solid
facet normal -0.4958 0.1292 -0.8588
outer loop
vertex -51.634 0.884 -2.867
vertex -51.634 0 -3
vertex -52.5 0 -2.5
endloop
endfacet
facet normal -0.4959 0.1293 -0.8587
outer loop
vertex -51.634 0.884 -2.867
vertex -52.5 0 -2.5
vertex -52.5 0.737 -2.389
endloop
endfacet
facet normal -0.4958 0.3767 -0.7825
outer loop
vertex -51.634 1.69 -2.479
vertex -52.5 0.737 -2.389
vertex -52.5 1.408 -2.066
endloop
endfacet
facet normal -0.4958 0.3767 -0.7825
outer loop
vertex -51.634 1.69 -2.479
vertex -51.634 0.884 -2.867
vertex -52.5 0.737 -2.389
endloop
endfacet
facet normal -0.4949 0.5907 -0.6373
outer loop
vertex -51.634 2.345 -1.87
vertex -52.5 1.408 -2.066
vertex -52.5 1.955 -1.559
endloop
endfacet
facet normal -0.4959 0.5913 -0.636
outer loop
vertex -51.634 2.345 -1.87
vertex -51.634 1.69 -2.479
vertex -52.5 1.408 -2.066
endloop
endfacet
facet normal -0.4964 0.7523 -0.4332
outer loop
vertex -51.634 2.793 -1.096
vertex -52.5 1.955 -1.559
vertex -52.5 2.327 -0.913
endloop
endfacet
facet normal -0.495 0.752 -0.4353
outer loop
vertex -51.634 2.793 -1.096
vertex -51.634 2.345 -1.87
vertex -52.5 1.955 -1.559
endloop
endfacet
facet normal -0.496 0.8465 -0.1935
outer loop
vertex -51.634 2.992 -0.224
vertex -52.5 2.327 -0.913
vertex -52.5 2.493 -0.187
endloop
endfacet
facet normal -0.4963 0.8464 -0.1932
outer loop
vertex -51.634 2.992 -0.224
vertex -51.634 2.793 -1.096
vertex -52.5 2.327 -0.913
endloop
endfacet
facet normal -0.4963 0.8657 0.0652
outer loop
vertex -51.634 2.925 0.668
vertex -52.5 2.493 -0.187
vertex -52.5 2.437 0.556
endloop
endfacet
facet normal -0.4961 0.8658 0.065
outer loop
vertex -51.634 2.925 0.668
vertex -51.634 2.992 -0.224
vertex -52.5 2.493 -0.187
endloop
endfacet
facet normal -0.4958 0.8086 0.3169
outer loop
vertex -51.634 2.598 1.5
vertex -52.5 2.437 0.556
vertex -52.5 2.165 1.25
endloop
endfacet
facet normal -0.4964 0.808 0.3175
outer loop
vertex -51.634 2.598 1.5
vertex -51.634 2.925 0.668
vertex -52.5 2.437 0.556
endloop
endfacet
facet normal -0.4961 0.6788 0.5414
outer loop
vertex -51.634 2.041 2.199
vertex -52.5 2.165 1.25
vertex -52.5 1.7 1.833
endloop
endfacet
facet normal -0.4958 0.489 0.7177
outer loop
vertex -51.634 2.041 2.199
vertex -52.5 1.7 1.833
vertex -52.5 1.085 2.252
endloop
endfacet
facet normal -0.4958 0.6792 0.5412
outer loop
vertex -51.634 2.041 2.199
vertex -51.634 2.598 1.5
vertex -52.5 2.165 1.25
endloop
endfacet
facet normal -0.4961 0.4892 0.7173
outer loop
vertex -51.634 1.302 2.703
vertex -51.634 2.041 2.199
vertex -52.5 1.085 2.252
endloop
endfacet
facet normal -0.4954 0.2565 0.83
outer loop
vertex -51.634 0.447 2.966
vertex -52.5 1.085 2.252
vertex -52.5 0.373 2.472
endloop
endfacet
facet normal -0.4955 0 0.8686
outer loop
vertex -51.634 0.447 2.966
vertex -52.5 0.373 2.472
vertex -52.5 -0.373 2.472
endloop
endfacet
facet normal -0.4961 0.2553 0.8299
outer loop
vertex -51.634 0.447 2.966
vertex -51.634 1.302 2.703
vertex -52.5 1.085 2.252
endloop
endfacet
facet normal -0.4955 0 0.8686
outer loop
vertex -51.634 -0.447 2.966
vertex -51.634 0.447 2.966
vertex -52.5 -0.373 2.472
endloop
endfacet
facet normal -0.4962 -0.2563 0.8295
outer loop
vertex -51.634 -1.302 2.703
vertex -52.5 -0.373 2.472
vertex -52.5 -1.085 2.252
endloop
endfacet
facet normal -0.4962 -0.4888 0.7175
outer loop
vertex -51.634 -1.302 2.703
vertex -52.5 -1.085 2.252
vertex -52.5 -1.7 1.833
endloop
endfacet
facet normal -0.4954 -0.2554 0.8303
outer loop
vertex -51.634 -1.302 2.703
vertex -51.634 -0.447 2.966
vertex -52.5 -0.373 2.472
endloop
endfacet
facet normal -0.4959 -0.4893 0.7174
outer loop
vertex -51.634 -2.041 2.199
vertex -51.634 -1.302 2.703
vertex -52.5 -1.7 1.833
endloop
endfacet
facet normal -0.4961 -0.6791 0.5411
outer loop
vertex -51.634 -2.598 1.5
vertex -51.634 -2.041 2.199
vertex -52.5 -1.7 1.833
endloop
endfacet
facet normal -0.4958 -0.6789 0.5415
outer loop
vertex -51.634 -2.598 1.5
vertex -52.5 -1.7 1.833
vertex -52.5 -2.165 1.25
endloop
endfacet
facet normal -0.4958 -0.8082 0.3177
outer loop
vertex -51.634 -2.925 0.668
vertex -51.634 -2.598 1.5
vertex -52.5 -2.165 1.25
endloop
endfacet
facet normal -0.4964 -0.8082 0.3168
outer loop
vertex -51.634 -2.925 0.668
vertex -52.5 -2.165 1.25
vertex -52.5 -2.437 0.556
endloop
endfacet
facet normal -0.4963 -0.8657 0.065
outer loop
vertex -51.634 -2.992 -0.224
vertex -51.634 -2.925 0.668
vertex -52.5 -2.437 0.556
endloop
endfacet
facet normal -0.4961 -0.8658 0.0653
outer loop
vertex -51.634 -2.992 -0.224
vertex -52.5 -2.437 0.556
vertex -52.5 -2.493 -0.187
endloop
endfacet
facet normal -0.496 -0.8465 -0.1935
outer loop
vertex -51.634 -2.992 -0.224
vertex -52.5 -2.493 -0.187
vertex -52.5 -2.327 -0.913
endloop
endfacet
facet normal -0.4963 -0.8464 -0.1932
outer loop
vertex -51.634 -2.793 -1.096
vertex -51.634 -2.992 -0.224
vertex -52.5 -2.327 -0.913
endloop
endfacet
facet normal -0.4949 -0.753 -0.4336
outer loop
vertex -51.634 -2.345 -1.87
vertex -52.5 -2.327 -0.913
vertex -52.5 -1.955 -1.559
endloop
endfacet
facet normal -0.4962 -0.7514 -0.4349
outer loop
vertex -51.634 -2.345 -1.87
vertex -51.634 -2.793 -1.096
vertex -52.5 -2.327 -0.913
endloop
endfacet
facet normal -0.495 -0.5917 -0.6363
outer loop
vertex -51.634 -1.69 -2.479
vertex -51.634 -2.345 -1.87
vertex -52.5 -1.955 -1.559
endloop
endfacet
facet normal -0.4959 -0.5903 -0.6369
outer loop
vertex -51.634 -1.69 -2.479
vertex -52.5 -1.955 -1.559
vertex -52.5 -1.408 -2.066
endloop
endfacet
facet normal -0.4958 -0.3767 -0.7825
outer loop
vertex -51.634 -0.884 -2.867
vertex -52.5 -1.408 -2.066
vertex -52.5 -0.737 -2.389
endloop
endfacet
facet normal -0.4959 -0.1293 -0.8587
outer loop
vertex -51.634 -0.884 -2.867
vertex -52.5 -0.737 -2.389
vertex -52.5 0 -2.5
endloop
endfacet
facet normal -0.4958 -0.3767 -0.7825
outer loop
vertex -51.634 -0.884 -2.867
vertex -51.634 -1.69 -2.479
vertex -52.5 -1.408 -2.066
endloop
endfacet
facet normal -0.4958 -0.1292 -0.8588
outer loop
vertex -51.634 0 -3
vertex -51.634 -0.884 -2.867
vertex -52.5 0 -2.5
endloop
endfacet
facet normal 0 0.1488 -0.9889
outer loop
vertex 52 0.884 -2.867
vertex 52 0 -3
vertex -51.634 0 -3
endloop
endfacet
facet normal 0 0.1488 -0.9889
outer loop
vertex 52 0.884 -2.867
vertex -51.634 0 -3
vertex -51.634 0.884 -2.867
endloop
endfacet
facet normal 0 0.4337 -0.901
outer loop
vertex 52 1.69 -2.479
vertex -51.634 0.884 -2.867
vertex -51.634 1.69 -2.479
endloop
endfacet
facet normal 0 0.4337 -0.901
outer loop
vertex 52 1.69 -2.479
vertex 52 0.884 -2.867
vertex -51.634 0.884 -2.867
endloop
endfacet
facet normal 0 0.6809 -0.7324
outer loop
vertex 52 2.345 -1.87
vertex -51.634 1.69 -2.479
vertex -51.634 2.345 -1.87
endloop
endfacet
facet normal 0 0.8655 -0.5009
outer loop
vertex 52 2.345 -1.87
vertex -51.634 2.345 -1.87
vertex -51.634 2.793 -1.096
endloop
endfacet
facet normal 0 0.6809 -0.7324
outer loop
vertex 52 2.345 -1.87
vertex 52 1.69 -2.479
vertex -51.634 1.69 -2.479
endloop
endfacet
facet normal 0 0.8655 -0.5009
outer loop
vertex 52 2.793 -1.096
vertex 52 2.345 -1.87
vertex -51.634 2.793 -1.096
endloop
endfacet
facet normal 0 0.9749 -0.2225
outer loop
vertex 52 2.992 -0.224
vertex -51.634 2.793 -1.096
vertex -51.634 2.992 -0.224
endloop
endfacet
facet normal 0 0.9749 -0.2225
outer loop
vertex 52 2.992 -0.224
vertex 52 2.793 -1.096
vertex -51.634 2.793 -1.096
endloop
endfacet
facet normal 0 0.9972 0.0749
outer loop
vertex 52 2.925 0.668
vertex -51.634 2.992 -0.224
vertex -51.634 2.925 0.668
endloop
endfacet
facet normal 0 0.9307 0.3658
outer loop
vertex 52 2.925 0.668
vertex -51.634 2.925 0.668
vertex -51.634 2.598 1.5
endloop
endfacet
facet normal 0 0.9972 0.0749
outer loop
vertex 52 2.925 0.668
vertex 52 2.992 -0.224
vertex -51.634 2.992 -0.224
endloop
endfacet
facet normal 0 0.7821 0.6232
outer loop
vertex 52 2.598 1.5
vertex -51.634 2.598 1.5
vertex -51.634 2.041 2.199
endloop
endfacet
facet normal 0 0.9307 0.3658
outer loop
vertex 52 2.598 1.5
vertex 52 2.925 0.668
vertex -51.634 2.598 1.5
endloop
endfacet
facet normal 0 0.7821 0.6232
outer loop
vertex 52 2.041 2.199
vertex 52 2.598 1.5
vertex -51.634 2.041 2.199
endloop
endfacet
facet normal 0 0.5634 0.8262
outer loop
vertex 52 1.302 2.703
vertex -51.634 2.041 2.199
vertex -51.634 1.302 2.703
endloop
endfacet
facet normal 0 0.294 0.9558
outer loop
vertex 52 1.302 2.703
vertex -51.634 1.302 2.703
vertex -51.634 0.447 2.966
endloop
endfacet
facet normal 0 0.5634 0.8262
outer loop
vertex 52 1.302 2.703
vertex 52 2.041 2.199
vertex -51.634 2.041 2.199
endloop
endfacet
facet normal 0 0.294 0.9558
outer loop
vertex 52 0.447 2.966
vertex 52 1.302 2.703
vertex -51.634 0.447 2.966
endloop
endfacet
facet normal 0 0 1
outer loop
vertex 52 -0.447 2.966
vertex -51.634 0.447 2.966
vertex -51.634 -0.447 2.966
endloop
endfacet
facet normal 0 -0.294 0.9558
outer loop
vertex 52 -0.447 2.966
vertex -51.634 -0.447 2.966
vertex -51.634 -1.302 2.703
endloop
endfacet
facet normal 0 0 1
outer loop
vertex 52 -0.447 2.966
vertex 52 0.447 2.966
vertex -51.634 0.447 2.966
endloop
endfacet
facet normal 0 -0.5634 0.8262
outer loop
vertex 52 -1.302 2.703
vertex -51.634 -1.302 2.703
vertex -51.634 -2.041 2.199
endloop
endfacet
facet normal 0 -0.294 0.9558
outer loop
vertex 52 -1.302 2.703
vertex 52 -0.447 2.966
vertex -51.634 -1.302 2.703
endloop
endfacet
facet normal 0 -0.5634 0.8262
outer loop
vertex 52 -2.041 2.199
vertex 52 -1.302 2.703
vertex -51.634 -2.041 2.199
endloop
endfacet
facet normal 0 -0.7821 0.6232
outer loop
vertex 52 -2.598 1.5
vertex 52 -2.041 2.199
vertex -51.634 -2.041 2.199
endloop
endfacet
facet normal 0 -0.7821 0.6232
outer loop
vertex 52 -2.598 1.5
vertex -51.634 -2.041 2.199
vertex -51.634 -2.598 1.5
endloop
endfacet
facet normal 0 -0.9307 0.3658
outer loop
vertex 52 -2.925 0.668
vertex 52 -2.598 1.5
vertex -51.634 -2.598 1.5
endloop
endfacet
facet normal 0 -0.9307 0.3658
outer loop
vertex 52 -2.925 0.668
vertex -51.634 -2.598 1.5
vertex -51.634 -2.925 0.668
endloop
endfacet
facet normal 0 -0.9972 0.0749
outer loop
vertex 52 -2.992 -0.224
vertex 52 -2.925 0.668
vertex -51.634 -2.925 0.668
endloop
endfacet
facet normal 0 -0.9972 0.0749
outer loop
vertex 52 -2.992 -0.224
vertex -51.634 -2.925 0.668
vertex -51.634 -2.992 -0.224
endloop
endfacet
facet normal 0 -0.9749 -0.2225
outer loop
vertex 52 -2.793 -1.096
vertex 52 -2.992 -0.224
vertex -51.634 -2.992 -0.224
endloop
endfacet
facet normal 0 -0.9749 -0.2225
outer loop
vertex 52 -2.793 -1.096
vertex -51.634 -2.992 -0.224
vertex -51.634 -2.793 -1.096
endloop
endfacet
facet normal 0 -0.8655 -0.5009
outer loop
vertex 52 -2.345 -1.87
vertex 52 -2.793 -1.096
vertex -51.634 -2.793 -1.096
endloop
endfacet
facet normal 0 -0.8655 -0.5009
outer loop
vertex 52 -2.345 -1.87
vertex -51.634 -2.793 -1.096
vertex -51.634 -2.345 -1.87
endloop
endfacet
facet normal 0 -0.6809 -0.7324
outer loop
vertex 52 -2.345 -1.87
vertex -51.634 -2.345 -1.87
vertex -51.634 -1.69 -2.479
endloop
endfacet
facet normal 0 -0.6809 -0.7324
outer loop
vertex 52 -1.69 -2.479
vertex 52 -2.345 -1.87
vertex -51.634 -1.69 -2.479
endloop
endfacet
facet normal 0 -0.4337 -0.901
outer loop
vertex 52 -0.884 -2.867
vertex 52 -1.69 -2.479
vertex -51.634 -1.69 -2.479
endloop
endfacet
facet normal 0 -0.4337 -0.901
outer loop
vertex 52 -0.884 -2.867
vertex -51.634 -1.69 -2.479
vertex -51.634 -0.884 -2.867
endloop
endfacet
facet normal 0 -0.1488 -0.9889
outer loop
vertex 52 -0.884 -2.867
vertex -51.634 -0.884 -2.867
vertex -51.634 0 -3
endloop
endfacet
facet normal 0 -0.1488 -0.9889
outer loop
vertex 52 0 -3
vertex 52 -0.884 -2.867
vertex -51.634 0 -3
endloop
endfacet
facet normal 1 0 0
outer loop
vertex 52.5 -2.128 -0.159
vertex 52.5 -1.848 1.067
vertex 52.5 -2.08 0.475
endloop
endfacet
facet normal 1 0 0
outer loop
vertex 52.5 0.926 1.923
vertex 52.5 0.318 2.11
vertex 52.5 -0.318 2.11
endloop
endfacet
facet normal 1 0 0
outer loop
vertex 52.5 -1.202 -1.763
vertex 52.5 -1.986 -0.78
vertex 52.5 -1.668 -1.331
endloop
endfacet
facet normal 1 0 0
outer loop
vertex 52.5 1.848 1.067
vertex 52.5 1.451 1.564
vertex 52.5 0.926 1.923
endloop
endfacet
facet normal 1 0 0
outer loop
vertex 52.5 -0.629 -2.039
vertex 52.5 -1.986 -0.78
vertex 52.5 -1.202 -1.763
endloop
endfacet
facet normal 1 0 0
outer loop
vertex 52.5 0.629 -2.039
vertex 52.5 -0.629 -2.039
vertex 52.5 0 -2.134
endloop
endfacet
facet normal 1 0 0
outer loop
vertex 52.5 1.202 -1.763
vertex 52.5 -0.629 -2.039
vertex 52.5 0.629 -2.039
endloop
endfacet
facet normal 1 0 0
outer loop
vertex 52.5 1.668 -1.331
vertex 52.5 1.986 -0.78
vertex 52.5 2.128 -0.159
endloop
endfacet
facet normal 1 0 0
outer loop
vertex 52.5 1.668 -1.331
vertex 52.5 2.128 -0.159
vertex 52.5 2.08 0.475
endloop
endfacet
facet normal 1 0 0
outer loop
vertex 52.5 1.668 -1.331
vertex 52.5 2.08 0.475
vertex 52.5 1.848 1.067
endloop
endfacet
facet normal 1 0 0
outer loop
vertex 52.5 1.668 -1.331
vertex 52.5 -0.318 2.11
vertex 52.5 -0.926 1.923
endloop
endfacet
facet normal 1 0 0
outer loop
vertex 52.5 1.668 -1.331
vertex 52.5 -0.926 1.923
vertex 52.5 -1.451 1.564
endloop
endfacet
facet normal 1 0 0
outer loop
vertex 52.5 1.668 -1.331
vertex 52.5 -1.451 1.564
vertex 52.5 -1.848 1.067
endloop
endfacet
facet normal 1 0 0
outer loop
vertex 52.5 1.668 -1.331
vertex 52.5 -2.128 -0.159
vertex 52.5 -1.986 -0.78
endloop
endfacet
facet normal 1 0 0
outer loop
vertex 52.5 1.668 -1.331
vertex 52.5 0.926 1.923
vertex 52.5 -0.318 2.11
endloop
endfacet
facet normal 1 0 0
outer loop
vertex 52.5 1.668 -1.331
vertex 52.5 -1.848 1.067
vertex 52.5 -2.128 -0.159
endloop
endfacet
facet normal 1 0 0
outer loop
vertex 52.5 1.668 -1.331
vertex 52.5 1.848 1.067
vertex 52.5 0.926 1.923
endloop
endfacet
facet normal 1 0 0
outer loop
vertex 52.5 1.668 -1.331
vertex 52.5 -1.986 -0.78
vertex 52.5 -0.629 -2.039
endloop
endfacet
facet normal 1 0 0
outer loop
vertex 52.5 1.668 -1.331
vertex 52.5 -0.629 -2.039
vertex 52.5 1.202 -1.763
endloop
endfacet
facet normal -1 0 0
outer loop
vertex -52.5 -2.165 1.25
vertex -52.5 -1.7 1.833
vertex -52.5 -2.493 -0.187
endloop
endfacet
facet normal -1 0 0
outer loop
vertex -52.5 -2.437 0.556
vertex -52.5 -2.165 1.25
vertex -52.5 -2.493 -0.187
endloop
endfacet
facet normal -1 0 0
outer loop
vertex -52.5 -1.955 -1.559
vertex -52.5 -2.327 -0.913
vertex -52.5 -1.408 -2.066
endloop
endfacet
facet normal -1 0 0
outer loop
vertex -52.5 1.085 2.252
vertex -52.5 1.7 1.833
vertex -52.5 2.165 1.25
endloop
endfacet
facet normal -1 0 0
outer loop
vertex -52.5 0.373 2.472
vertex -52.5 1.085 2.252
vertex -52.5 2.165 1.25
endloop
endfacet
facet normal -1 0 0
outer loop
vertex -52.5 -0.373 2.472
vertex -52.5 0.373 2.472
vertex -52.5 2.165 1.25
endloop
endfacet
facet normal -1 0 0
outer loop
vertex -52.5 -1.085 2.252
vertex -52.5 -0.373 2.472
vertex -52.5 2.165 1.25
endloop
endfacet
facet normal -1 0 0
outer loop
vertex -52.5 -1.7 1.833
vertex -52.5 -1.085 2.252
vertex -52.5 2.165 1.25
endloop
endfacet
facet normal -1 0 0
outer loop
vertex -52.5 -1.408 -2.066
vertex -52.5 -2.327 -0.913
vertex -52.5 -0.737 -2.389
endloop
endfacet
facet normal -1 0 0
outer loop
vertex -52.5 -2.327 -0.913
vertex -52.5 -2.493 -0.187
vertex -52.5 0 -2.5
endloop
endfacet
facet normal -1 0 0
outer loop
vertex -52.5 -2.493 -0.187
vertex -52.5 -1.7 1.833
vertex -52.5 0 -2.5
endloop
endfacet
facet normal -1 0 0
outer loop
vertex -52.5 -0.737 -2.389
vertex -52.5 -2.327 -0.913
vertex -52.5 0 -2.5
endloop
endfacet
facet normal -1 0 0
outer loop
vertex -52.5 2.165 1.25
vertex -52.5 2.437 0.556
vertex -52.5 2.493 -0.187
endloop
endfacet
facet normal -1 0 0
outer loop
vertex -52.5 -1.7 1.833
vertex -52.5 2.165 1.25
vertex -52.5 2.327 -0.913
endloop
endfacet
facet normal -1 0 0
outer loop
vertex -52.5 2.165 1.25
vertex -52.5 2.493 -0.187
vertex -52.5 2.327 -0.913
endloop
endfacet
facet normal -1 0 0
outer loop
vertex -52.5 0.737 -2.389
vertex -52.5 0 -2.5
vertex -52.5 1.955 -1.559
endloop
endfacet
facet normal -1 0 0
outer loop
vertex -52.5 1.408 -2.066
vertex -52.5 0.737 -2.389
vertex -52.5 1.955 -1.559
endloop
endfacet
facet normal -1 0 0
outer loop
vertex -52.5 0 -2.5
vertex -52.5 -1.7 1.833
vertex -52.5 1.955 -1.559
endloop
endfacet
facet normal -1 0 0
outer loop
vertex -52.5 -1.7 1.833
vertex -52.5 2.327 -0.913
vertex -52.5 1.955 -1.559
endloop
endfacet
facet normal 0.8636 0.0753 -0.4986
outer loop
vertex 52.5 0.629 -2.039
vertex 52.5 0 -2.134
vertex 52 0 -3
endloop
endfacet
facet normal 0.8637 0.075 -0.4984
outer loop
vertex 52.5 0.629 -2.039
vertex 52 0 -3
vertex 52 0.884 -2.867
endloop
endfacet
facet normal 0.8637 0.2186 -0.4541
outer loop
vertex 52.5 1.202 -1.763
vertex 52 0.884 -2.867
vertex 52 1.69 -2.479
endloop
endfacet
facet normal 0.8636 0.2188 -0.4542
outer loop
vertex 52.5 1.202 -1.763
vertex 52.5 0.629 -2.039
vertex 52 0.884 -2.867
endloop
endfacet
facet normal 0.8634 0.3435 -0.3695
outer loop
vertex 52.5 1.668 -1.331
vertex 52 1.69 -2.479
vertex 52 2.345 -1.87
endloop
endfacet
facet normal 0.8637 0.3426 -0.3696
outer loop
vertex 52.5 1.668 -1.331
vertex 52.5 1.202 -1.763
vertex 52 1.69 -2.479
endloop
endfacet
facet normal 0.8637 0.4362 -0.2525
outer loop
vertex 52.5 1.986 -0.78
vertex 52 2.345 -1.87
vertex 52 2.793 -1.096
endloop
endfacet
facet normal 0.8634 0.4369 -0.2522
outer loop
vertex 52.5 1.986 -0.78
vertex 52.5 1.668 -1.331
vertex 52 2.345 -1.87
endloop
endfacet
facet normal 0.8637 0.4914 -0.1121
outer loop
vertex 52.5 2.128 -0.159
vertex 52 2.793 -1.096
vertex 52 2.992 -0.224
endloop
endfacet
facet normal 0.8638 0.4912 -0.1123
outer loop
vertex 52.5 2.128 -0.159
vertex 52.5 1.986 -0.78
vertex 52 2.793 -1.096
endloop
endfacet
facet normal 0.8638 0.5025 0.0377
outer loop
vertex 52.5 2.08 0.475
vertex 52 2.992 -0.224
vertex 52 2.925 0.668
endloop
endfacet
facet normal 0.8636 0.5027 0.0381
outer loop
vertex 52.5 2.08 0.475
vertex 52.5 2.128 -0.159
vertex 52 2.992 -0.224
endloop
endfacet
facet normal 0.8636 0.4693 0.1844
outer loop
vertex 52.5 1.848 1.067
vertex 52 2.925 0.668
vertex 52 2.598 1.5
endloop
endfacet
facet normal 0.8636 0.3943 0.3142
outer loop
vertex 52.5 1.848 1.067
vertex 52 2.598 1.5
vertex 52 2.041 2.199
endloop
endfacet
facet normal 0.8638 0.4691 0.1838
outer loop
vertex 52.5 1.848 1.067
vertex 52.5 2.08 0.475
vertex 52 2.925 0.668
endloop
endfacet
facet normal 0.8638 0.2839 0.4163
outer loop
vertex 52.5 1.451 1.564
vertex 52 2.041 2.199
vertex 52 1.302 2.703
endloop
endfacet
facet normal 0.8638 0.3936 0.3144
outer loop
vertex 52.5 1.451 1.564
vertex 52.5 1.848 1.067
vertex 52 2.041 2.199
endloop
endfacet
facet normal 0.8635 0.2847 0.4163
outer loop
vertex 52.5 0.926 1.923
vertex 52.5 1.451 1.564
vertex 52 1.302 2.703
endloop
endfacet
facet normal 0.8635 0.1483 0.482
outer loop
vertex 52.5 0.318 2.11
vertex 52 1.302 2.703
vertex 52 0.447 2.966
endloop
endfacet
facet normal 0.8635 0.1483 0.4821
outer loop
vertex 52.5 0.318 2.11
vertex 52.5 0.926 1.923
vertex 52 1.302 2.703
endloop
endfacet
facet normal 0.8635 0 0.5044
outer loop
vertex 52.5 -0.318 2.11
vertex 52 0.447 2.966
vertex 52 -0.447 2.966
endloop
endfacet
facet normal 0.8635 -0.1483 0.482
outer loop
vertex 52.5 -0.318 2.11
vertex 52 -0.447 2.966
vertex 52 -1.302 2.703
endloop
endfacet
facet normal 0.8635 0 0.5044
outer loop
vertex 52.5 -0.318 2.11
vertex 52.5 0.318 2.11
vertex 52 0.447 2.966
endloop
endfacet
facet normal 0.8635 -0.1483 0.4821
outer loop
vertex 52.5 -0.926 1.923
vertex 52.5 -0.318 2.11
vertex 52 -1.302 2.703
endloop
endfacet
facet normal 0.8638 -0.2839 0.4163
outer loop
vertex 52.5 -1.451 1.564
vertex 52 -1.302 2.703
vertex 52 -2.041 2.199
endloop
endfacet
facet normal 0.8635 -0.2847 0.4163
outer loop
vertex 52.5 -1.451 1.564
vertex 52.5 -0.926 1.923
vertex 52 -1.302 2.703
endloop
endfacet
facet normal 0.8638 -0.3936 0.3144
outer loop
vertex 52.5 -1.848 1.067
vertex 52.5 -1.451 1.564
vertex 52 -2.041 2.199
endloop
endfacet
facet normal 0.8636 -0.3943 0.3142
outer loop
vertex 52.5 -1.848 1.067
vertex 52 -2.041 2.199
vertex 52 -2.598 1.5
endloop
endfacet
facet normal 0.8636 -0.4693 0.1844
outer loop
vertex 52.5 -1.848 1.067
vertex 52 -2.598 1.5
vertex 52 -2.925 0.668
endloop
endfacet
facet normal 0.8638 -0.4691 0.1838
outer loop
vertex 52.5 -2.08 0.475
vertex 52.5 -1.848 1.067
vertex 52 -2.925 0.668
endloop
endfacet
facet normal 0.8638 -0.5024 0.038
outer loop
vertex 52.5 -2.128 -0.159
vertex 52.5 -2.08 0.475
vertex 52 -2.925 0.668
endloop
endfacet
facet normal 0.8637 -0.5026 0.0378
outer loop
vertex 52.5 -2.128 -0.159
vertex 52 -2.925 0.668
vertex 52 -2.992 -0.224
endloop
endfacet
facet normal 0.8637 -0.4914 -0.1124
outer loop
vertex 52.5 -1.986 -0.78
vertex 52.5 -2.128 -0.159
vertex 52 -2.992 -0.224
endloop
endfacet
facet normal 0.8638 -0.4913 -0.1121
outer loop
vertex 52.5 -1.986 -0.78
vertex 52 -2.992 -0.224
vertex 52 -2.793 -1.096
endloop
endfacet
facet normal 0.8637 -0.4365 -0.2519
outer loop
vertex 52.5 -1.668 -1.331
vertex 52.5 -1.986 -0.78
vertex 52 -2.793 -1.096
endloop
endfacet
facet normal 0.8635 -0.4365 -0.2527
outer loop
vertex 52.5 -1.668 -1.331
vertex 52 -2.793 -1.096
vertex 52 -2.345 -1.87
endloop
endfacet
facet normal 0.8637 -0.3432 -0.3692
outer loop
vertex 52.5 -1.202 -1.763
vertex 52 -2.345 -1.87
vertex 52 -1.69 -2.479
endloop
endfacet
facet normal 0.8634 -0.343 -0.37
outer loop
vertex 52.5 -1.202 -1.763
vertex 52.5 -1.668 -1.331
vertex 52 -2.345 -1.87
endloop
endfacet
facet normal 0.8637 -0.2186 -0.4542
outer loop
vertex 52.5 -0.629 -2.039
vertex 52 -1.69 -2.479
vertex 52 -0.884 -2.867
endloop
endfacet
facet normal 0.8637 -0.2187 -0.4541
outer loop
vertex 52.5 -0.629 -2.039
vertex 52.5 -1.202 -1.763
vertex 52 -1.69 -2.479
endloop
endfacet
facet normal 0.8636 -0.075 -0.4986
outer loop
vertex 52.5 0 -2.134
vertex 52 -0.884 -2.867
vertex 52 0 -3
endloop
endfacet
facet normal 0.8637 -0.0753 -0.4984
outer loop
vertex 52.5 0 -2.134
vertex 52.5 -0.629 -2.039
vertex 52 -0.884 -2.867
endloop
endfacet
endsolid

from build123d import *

# Parameters (mm, degrees)
SKETCH1_R             = 3
BOSS_EXTRUDE1_DEPTH   = 52.5
CHAMFER1_SIZE         = 0.5
CHAMFER1_SIZE2        = 0.866025404
CHAMFER1_PART_2_SIZE  = 0.5
CHAMFER1_PART_2_SIZE2 = 0.866025404


with BuildPart() as part:
    # Sketch1 → Boss-Extrude1 (new body, symmetric)
    with BuildSketch(Plane(origin=(0, 0, 0), x_dir=(0, 0, -1), z_dir=(1, 0, 0))):
        Circle(SKETCH1_R)
    extrude(amount=BOSS_EXTRUDE1_DEPTH, both=True)

    # Chamfer1
    chamfer1_edges = [part.edges().sort_by_distance(p)[0] for p in [
        (-52.5, 0, 3),
    ]]
    chamfer1_side = [part.faces().sort_by_distance(p)[0] for p in [
        (-52.5, 0, 0),
    ]]
    chamfer(chamfer1_edges, length=CHAMFER1_SIZE, length2=CHAMFER1_SIZE2, reference=chamfer1_side[0])

    # Chamfer1 part 2
    chamfer1_part_2_edges = [part.edges().sort_by_distance(p)[0] for p in [
        (52.5, 0, 3),
    ]]
    chamfer1_part_2_side = [part.faces().sort_by_distance(p)[0] for p in [
        (0, 0, 3),
    ]]
    chamfer(chamfer1_part_2_edges, length=CHAMFER1_PART_2_SIZE, length2=CHAMFER1_PART_2_SIZE2, reference=chamfer1_part_2_side[0])


solid = part.part
